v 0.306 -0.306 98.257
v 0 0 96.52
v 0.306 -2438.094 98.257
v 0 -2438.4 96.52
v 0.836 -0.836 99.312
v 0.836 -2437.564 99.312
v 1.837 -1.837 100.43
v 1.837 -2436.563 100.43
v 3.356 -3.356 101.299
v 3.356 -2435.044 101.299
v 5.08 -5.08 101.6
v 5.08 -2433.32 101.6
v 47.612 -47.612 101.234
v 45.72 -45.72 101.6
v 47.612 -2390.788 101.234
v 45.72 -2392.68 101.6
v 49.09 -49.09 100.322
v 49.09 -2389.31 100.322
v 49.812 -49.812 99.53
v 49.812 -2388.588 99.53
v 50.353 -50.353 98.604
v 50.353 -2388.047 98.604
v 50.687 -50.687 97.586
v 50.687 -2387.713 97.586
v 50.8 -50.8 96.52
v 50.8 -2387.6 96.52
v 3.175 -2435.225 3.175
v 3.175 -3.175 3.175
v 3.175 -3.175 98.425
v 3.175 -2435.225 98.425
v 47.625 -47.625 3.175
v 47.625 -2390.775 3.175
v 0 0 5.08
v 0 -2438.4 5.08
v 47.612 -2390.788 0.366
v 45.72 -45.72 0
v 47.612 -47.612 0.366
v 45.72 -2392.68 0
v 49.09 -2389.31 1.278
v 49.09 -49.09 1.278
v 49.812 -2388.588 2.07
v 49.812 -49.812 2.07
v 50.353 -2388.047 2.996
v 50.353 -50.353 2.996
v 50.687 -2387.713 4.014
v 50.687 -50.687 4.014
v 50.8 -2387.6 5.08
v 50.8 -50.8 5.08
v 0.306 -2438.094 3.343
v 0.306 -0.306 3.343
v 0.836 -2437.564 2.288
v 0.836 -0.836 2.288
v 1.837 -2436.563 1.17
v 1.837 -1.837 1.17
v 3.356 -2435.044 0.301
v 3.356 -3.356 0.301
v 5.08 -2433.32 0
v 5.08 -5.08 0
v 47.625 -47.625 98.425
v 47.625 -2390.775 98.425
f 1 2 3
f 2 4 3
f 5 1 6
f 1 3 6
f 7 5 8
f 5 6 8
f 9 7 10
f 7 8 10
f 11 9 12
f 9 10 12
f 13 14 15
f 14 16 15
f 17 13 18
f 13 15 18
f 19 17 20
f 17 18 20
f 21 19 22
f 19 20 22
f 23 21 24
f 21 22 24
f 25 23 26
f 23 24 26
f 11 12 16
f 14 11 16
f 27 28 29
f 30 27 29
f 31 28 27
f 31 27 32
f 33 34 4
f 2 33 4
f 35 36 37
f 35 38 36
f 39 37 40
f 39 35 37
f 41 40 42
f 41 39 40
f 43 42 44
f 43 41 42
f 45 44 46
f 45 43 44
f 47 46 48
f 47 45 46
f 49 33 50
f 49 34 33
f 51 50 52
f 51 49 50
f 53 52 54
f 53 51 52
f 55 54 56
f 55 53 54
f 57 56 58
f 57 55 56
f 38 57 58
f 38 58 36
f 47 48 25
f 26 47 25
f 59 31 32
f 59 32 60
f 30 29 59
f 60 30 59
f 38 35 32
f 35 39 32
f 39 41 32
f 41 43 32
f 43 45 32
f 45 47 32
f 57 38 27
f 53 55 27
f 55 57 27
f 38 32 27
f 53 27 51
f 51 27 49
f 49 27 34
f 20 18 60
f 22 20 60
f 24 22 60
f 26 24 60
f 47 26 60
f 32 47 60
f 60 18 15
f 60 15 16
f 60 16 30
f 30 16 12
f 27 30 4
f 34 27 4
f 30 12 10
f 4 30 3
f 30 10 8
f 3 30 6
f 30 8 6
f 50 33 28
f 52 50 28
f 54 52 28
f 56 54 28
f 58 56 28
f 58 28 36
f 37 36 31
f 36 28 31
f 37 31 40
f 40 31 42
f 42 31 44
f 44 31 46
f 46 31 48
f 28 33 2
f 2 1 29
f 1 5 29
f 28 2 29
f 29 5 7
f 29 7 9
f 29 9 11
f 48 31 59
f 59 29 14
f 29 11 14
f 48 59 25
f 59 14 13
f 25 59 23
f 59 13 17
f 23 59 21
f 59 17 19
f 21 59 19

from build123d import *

# Parameters (mm, degrees)
F0_W     = 50.8
F0_H     = 101.6
F0_W_2   = 44.45
F0_H_2   = 95.25
F1_DEPTH = 2438.4
F3_DEPTH = 135.382
F4_R     = 5.08


with BuildPart() as f1:
    # F0 (on Front) → F1 (new body)
    with BuildSketch(Plane.XZ):
        with Locations((25.4, 50.8)):
            Rectangle(F0_W, F0_H)
        with Locations((25.4, 50.8)):
            Rectangle(F0_W_2, F0_H_2, mode=Mode.SUBTRACT)
    extrude(amount=F1_DEPTH)

    # F2 (on face) → F3 (cut)
    with BuildSketch(Plane.XY.offset(101.6)):
        Polygon((50.8, 0), (0, 0), (50.8, -50.8), align=None)
        Polygon((50.8, -2387.6), (0, -2438.4), (50.8, -2438.4), align=None)
    extrude(amount=-F3_DEPTH, mode=Mode.SUBTRACT)

    # F4
    f4_edges = [f1.edges().sort_by_distance(p)[0] for p in [
        (50.8, -1219.2, 101.6),
        (0, -1219.2, 101.6),
        (50.8, -1219.2, 0),
        (0, -1219.2, 0),
    ]]
    fillet(f4_edges, radius=F4_R)


solid = f1.part
